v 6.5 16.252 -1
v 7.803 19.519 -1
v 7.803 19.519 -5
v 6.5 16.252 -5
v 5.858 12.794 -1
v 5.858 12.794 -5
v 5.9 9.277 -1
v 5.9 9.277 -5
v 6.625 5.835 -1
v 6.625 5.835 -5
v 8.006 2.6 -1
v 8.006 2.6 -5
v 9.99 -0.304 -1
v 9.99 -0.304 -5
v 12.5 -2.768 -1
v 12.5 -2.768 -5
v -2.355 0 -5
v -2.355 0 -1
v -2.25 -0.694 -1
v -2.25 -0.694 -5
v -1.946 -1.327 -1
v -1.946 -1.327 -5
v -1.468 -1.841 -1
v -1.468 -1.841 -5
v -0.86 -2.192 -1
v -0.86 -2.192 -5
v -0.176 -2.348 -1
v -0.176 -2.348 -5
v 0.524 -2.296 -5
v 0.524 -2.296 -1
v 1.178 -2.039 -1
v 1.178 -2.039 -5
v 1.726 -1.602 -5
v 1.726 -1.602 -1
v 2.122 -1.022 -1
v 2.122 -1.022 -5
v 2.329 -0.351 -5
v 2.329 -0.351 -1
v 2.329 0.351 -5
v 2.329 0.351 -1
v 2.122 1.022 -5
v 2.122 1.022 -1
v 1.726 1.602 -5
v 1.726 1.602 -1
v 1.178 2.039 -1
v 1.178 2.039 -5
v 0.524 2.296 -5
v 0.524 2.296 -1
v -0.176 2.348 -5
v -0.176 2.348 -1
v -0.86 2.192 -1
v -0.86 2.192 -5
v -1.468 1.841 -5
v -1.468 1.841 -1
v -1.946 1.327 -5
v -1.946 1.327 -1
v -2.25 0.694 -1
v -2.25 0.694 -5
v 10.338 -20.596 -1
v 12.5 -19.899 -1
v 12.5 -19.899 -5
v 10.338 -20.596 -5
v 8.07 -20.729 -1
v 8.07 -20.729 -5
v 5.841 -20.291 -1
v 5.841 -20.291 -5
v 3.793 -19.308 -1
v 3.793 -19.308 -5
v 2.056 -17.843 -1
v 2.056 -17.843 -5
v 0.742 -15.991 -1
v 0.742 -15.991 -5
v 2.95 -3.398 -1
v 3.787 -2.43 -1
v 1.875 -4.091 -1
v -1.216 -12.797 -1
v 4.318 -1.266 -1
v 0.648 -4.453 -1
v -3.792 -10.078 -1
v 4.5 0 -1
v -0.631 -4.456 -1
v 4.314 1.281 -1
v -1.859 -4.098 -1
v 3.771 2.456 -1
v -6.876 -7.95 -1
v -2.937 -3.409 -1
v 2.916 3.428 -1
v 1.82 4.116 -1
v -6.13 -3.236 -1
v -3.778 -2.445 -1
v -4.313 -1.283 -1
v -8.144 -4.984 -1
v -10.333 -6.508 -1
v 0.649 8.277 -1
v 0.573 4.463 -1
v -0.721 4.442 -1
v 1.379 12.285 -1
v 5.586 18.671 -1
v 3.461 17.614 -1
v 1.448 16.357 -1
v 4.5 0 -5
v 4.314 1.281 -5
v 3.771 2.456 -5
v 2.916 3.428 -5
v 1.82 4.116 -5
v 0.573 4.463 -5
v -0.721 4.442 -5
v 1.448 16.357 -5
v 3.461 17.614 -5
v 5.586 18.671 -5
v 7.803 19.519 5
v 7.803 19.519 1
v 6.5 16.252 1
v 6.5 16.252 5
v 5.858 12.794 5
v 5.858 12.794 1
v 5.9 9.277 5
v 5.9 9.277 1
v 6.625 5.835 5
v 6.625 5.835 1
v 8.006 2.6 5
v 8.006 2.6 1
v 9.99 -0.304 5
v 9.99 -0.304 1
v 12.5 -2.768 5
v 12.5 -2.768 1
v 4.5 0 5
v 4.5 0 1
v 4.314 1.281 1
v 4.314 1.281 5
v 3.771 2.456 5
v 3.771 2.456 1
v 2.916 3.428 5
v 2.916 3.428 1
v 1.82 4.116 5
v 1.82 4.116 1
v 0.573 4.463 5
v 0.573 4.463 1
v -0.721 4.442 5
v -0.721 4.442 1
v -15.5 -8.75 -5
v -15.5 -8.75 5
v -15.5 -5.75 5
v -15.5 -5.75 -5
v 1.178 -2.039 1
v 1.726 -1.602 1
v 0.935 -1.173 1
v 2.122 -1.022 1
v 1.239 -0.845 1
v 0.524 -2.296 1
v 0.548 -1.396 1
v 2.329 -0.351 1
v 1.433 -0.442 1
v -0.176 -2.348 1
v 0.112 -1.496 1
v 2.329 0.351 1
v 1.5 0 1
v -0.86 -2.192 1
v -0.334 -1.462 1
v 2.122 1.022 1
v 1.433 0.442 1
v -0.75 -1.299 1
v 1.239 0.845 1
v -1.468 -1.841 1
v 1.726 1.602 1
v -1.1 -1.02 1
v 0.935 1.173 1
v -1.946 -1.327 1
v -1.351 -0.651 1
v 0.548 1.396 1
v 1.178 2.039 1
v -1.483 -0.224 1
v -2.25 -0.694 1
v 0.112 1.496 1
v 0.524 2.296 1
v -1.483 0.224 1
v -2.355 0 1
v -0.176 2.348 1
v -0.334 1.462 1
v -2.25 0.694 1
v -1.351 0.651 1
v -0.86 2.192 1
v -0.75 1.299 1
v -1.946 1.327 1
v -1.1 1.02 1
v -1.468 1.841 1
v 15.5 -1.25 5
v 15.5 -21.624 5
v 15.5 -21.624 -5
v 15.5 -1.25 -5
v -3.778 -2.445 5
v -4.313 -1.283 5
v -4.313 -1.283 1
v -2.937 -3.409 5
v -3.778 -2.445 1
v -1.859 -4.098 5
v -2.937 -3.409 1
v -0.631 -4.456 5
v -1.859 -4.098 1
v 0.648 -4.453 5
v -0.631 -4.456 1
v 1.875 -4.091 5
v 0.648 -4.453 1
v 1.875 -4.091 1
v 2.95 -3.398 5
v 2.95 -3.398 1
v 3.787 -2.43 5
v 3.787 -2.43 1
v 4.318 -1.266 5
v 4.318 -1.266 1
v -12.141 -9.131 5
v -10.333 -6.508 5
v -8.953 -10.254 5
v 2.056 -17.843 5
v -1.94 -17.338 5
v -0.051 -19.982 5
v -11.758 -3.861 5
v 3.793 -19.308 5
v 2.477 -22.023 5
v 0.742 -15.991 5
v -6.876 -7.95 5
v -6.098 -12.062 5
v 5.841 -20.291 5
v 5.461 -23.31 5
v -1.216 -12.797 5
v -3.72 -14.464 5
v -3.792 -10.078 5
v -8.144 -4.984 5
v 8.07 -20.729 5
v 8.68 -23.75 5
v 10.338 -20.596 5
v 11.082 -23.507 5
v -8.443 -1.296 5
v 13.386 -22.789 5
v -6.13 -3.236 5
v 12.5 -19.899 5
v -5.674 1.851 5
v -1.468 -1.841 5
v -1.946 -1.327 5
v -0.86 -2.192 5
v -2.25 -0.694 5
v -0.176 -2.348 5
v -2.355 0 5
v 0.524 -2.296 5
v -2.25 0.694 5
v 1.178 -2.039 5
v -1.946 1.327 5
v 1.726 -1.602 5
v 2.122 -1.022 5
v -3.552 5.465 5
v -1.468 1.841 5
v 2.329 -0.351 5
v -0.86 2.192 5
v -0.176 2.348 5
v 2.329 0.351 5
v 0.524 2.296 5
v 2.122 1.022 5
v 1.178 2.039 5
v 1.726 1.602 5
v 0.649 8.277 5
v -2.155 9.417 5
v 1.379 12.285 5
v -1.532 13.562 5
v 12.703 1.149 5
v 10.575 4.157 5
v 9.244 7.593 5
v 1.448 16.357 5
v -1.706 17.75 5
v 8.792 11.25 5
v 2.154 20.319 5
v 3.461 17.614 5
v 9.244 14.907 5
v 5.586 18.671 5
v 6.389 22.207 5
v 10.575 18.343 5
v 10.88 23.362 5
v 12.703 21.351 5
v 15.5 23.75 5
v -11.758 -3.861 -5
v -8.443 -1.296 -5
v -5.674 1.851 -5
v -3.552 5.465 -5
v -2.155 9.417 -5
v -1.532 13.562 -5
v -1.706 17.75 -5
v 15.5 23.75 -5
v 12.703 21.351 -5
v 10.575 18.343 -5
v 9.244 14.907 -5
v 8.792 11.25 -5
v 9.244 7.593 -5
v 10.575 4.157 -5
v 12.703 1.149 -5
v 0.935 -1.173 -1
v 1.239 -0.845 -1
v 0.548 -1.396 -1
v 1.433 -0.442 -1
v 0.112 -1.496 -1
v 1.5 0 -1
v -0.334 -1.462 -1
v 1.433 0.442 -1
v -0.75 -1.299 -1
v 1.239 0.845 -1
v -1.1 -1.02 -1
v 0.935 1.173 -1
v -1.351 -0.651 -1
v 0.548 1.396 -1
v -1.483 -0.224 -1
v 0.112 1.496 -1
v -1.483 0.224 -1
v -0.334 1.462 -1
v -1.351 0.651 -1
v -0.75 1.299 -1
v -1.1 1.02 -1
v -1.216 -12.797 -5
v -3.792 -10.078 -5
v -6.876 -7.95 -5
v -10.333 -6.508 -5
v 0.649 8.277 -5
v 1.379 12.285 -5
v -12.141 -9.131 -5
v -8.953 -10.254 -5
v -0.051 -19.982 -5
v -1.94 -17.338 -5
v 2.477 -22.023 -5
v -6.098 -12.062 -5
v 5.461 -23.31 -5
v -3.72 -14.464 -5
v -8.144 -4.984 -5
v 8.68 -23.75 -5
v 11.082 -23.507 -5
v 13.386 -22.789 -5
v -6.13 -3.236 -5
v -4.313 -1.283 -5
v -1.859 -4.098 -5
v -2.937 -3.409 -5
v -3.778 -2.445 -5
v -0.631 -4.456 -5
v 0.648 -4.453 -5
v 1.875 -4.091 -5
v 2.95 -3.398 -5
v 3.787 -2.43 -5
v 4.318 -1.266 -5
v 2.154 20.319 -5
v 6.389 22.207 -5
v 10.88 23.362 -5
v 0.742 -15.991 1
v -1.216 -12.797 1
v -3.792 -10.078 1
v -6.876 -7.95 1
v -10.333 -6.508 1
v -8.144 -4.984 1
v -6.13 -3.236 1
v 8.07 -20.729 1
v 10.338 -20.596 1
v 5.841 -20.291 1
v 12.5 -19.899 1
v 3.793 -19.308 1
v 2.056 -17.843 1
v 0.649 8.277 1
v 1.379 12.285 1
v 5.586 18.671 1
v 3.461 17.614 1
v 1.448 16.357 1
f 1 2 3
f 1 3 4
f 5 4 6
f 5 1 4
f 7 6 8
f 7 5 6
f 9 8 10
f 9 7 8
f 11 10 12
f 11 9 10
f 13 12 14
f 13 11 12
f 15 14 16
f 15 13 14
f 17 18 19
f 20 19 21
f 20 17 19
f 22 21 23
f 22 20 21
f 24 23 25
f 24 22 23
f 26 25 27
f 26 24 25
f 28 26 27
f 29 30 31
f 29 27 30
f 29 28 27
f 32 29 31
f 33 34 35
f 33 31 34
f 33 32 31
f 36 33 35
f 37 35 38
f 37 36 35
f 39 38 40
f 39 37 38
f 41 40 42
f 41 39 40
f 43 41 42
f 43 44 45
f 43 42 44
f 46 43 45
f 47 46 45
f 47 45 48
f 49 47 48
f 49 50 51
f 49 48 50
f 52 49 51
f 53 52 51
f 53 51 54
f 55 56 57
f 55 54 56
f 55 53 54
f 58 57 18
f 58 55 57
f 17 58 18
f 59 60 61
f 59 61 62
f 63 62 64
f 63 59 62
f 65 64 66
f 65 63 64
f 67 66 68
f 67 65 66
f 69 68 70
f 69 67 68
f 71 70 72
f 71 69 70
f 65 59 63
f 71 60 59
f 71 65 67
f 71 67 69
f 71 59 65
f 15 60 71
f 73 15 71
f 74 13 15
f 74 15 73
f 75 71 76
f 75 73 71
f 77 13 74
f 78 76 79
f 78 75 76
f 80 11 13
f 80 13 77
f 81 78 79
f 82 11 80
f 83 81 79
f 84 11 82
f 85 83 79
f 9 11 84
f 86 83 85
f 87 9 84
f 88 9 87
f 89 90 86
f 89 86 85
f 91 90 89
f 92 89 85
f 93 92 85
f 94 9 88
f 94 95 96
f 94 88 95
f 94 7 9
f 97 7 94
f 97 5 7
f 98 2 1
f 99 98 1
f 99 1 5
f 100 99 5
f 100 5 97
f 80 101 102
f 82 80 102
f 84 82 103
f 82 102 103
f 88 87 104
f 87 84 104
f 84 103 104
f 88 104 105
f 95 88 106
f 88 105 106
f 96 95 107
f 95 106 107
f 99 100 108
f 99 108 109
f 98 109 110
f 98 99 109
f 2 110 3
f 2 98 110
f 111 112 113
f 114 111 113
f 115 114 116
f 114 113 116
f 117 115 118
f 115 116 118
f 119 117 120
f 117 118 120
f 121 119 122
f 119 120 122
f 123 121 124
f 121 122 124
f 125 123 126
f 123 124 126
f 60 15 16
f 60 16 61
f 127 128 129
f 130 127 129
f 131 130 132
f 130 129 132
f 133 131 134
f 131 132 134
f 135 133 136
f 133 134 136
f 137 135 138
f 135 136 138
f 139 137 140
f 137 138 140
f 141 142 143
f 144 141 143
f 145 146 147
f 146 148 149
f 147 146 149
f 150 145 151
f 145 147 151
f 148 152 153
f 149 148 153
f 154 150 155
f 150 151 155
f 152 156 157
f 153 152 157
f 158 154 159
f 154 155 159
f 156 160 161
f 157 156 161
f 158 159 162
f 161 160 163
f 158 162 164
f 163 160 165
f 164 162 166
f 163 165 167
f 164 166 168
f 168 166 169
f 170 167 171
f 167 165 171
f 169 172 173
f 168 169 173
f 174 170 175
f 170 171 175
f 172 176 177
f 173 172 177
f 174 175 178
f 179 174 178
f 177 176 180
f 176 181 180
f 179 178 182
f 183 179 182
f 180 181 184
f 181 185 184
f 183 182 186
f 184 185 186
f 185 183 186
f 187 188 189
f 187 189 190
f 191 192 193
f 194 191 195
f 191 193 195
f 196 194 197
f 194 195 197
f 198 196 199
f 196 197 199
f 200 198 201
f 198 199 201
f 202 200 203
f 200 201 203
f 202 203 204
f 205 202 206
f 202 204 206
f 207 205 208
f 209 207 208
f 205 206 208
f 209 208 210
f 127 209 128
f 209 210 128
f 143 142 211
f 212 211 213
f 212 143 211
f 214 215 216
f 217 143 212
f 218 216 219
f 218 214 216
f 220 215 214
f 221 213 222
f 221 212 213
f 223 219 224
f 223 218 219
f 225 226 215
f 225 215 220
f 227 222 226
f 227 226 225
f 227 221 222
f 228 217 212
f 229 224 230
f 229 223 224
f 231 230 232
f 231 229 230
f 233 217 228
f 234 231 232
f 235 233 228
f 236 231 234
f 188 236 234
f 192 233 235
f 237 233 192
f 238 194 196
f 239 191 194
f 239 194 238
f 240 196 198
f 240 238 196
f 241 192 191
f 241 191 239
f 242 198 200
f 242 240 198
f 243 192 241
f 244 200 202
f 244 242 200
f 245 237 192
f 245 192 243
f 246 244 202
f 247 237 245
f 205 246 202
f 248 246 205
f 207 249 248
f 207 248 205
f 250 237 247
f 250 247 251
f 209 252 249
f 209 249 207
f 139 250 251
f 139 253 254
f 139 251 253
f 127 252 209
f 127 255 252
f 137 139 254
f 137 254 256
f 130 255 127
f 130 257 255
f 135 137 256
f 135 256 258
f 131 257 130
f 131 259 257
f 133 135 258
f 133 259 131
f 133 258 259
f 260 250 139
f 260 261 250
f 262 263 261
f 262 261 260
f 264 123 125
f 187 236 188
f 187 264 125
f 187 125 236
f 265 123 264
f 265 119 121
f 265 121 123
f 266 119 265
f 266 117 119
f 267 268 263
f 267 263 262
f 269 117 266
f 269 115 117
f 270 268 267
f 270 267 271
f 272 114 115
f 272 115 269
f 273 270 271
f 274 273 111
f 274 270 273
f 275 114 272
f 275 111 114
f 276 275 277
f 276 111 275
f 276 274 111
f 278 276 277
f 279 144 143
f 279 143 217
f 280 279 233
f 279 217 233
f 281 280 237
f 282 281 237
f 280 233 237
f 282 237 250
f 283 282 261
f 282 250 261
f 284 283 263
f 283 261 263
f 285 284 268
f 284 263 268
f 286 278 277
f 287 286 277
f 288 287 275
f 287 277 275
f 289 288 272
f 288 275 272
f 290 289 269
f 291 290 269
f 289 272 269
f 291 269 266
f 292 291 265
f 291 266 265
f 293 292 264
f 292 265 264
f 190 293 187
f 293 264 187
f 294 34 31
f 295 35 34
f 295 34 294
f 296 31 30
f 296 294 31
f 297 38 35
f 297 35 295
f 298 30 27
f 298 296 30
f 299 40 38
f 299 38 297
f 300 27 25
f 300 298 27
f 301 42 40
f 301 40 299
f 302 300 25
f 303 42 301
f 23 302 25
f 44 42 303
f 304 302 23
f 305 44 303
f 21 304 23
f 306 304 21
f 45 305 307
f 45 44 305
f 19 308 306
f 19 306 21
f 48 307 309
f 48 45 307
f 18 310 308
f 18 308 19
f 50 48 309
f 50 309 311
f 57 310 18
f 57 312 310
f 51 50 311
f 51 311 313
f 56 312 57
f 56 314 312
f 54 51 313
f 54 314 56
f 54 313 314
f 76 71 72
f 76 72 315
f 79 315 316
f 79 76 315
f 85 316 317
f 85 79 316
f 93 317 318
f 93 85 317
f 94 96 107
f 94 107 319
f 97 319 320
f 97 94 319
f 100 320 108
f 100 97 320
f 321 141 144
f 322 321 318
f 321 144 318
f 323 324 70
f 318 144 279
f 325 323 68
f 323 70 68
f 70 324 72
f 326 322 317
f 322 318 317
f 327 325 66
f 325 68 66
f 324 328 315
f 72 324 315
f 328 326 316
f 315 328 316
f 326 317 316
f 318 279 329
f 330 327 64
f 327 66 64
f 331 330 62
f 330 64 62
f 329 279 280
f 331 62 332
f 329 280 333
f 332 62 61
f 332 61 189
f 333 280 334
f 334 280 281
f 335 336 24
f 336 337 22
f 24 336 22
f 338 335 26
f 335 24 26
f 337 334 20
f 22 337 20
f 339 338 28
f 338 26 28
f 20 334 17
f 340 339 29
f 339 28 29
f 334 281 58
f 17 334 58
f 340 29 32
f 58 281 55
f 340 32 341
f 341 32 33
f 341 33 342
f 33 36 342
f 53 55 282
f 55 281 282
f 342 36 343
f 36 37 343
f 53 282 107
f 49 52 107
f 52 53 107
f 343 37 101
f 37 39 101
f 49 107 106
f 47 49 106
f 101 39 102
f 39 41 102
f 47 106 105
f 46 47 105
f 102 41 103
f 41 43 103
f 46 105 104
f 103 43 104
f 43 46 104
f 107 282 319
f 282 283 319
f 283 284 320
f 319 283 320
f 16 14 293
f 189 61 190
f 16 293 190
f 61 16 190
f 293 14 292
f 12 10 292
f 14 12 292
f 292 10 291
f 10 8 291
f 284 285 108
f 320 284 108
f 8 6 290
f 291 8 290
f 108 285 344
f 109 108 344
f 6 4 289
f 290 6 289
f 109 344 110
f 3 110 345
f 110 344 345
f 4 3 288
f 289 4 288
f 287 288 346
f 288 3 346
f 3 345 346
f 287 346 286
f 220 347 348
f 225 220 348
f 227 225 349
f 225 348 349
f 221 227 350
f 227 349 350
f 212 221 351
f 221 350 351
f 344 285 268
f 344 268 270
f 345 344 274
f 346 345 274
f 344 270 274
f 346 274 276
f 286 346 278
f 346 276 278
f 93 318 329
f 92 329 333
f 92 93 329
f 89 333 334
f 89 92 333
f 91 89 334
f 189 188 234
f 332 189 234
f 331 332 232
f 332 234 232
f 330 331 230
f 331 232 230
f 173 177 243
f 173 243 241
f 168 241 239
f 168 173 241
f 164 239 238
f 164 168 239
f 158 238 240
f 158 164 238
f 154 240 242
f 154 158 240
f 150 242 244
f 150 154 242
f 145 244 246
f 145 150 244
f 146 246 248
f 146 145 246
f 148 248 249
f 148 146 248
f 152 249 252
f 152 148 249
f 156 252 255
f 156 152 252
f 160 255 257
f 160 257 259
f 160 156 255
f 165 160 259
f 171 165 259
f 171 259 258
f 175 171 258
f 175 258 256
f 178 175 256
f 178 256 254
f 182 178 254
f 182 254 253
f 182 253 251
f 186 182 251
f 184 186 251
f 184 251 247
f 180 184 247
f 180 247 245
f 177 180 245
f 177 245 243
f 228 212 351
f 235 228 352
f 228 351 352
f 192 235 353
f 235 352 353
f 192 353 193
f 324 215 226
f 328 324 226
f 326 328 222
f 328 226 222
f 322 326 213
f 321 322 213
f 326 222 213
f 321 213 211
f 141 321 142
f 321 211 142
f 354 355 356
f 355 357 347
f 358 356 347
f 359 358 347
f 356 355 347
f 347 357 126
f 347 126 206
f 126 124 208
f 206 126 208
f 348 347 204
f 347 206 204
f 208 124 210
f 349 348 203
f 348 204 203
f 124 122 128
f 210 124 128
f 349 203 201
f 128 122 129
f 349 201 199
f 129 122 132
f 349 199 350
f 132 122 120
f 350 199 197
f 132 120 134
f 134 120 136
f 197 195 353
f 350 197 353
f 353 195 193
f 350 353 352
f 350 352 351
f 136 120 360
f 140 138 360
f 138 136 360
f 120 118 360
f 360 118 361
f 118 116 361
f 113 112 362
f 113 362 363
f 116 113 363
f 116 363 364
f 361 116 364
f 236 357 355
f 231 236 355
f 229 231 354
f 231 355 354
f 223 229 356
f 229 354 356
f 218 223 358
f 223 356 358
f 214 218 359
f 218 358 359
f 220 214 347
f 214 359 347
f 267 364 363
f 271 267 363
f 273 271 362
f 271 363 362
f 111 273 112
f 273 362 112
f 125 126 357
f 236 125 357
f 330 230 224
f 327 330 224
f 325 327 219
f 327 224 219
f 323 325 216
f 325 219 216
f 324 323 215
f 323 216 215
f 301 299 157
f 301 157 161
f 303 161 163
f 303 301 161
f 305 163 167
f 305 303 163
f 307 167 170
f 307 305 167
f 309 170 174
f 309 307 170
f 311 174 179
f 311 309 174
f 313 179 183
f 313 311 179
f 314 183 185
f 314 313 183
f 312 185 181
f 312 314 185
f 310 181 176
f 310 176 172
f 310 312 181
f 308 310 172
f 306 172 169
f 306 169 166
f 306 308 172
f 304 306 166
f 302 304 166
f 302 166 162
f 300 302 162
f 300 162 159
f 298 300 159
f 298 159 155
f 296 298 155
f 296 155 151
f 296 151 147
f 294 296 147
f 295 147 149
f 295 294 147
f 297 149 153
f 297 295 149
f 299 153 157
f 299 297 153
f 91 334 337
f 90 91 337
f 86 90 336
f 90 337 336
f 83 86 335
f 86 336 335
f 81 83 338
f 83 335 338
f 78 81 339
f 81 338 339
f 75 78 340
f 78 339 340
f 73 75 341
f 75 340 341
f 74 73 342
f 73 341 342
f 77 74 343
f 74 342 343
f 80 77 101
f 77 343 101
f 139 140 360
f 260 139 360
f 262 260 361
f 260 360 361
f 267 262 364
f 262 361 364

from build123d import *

# Parameters (mm, degrees)
CROQUIS1_W              = 31
CROQUIS1_H              = 47.5
CROQUIS1_R              = 1.5
SALIENTE_EXTRUIR1_DEPTH = 5
CORTAR_EXTRUIR1_DEPTH   = 10
CORTAR_EXTRUIR2_START   = -4
CROQUIS4_R              = 1.5
CORTAR_EXTRUIR2_DEPTH   = 4
SALIENTE_EXTRUIR2_START = -6
CROQUIS5_R              = 2.355
SALIENTE_EXTRUIR2_DEPTH = 10


with BuildPart() as part:
    # Croquis1 → Saliente-Extruir1 (new, symmetric)
    with BuildSketch(Plane.XY):
        Rectangle(CROQUIS1_W, CROQUIS1_H)
        Circle(CROQUIS1_R, mode=Mode.SUBTRACT)
    extrude(amount=SALIENTE_EXTRUIR1_DEPTH, both=True)

    # Croquis2 → Cortar-Extruir1 (cut)
    with BuildSketch(Plane.XY.offset(5)):
        with BuildLine():
            ThreePointArc((-15.5, -8.75), (-26.106601718, -34.356601718), (-0.5, -23.75))
            Line((-0.5, -23.75), (-15.5, -23.75))
            Line((-15.5, -23.75), (-15.5, -8.75))
        make_face()
        with BuildLine():
            Line((-15.5, -23.75), (-0.5, -23.75))
            ThreePointArc((-0.5, -23.75), (-0.864332185, -20.464086488), (-1.939630348, -17.337794848))
            ThreePointArc((-1.939630348, -17.337794848), (-7.474511768, -11.077528314), (-15.5, -8.75))
            Line((-15.5, -8.75), (-15.5, -23.75))
        make_face()
        with BuildLine():
            Line((-0.5, -23.75), (8.68, -23.75))
            ThreePointArc((8.68, -23.75), (2.477320667, -22.022622308), (-1.939630348, -17.337794848))
            ThreePointArc((-1.939630348, -17.337794848), (-0.864332185, -20.464086488), (-0.5, -23.75))
        make_face()
        with BuildLine():
            Line((8.68, -23.75), (15.5, -23.75))
            Line((15.5, -23.75), (15.5, -21.623580911))
            ThreePointArc((15.5, -21.623580911), (12.251906289, -23.206067627), (8.68, -23.75))
        make_face()
        with BuildLine():
            ThreePointArc((-1.706345602, 17.75), (6.388766151, 22.206978995), (15.5, 23.75))
            Line((15.5, 23.75), (-15.5, 23.75))
            Line((-15.5, 23.75), (-15.5, -5.75))
            ThreePointArc((-15.5, -5.75), (-4.526914837, 3.607383252), (-1.706345602, 17.75))
        make_face()
        with BuildLine():
            ThreePointArc((15.5, 23.75), (8.791561976, 11.25), (15.5, -1.25))
            Line((15.5, -1.25), (15.5, 23.75))
        make_face()
    extrude(amount=-CORTAR_EXTRUIR1_DEPTH, mode=Mode.SUBTRACT)

    # Croquis4 → Cortar-Extruir2 (cut)
    with BuildSketch(Plane.XY.offset(5).offset(CORTAR_EXTRUIR2_START)):
        with BuildLine():
            ThreePointArc((0.741753077, -15.99078245), (-3.792394766, -10.077692964), (-10.332847598, -6.50759483))
            ThreePointArc((-10.332847598, -6.50759483), (-1.276413132, 3.29347854), (1.447897595, 16.357098845))
            ThreePointArc((1.447897595, 16.357098845), (4.511231243, 18.167637942), (7.803157135, 19.518670428))
            ThreePointArc((7.803157135, 19.518670428), (6.178453275, 7.53807302), (12.5, -2.767868174))
            Line((12.5, -2.767868174), (12.5, -19.899085838))
            ThreePointArc((12.5, -19.899085838), (5.841215353, -20.290567998), (0.741753077, -15.99078245))
        make_face()
        Circle(CROQUIS4_R, mode=Mode.SUBTRACT)
    cortar_extruir2 = extrude(amount=CORTAR_EXTRUIR2_DEPTH, mode=Mode.SUBTRACT)

    # Simetría1: Cortar-Extruir2 across plane
    add(cortar_extruir2.mirror(Plane.XY), mode=Mode.SUBTRACT)

    # Croquis5 → Saliente-Extruir2 (add)
    with BuildSketch(Plane.XY.offset(1).offset(SALIENTE_EXTRUIR2_START)):
        with BuildLine():
            ThreePointArc((-4.313183402, -1.283140267), (0.648334286, -4.453050938), (4.5, 0))
            ThreePointArc((4.5, 0), (2.91581216, 3.427541312), (-0.721350866, 4.441807394))
            ThreePointArc((-0.721350866, 4.441807394), (-2.322917222, 1.457398417), (-4.313183402, -1.283140267))
        make_face()
        with Locations(Location((0, 0, 0), (0, 0, 180))):
            Circle(CROQUIS5_R, mode=Mode.SUBTRACT)
    extrude(amount=SALIENTE_EXTRUIR2_DEPTH)


solid = part.part
